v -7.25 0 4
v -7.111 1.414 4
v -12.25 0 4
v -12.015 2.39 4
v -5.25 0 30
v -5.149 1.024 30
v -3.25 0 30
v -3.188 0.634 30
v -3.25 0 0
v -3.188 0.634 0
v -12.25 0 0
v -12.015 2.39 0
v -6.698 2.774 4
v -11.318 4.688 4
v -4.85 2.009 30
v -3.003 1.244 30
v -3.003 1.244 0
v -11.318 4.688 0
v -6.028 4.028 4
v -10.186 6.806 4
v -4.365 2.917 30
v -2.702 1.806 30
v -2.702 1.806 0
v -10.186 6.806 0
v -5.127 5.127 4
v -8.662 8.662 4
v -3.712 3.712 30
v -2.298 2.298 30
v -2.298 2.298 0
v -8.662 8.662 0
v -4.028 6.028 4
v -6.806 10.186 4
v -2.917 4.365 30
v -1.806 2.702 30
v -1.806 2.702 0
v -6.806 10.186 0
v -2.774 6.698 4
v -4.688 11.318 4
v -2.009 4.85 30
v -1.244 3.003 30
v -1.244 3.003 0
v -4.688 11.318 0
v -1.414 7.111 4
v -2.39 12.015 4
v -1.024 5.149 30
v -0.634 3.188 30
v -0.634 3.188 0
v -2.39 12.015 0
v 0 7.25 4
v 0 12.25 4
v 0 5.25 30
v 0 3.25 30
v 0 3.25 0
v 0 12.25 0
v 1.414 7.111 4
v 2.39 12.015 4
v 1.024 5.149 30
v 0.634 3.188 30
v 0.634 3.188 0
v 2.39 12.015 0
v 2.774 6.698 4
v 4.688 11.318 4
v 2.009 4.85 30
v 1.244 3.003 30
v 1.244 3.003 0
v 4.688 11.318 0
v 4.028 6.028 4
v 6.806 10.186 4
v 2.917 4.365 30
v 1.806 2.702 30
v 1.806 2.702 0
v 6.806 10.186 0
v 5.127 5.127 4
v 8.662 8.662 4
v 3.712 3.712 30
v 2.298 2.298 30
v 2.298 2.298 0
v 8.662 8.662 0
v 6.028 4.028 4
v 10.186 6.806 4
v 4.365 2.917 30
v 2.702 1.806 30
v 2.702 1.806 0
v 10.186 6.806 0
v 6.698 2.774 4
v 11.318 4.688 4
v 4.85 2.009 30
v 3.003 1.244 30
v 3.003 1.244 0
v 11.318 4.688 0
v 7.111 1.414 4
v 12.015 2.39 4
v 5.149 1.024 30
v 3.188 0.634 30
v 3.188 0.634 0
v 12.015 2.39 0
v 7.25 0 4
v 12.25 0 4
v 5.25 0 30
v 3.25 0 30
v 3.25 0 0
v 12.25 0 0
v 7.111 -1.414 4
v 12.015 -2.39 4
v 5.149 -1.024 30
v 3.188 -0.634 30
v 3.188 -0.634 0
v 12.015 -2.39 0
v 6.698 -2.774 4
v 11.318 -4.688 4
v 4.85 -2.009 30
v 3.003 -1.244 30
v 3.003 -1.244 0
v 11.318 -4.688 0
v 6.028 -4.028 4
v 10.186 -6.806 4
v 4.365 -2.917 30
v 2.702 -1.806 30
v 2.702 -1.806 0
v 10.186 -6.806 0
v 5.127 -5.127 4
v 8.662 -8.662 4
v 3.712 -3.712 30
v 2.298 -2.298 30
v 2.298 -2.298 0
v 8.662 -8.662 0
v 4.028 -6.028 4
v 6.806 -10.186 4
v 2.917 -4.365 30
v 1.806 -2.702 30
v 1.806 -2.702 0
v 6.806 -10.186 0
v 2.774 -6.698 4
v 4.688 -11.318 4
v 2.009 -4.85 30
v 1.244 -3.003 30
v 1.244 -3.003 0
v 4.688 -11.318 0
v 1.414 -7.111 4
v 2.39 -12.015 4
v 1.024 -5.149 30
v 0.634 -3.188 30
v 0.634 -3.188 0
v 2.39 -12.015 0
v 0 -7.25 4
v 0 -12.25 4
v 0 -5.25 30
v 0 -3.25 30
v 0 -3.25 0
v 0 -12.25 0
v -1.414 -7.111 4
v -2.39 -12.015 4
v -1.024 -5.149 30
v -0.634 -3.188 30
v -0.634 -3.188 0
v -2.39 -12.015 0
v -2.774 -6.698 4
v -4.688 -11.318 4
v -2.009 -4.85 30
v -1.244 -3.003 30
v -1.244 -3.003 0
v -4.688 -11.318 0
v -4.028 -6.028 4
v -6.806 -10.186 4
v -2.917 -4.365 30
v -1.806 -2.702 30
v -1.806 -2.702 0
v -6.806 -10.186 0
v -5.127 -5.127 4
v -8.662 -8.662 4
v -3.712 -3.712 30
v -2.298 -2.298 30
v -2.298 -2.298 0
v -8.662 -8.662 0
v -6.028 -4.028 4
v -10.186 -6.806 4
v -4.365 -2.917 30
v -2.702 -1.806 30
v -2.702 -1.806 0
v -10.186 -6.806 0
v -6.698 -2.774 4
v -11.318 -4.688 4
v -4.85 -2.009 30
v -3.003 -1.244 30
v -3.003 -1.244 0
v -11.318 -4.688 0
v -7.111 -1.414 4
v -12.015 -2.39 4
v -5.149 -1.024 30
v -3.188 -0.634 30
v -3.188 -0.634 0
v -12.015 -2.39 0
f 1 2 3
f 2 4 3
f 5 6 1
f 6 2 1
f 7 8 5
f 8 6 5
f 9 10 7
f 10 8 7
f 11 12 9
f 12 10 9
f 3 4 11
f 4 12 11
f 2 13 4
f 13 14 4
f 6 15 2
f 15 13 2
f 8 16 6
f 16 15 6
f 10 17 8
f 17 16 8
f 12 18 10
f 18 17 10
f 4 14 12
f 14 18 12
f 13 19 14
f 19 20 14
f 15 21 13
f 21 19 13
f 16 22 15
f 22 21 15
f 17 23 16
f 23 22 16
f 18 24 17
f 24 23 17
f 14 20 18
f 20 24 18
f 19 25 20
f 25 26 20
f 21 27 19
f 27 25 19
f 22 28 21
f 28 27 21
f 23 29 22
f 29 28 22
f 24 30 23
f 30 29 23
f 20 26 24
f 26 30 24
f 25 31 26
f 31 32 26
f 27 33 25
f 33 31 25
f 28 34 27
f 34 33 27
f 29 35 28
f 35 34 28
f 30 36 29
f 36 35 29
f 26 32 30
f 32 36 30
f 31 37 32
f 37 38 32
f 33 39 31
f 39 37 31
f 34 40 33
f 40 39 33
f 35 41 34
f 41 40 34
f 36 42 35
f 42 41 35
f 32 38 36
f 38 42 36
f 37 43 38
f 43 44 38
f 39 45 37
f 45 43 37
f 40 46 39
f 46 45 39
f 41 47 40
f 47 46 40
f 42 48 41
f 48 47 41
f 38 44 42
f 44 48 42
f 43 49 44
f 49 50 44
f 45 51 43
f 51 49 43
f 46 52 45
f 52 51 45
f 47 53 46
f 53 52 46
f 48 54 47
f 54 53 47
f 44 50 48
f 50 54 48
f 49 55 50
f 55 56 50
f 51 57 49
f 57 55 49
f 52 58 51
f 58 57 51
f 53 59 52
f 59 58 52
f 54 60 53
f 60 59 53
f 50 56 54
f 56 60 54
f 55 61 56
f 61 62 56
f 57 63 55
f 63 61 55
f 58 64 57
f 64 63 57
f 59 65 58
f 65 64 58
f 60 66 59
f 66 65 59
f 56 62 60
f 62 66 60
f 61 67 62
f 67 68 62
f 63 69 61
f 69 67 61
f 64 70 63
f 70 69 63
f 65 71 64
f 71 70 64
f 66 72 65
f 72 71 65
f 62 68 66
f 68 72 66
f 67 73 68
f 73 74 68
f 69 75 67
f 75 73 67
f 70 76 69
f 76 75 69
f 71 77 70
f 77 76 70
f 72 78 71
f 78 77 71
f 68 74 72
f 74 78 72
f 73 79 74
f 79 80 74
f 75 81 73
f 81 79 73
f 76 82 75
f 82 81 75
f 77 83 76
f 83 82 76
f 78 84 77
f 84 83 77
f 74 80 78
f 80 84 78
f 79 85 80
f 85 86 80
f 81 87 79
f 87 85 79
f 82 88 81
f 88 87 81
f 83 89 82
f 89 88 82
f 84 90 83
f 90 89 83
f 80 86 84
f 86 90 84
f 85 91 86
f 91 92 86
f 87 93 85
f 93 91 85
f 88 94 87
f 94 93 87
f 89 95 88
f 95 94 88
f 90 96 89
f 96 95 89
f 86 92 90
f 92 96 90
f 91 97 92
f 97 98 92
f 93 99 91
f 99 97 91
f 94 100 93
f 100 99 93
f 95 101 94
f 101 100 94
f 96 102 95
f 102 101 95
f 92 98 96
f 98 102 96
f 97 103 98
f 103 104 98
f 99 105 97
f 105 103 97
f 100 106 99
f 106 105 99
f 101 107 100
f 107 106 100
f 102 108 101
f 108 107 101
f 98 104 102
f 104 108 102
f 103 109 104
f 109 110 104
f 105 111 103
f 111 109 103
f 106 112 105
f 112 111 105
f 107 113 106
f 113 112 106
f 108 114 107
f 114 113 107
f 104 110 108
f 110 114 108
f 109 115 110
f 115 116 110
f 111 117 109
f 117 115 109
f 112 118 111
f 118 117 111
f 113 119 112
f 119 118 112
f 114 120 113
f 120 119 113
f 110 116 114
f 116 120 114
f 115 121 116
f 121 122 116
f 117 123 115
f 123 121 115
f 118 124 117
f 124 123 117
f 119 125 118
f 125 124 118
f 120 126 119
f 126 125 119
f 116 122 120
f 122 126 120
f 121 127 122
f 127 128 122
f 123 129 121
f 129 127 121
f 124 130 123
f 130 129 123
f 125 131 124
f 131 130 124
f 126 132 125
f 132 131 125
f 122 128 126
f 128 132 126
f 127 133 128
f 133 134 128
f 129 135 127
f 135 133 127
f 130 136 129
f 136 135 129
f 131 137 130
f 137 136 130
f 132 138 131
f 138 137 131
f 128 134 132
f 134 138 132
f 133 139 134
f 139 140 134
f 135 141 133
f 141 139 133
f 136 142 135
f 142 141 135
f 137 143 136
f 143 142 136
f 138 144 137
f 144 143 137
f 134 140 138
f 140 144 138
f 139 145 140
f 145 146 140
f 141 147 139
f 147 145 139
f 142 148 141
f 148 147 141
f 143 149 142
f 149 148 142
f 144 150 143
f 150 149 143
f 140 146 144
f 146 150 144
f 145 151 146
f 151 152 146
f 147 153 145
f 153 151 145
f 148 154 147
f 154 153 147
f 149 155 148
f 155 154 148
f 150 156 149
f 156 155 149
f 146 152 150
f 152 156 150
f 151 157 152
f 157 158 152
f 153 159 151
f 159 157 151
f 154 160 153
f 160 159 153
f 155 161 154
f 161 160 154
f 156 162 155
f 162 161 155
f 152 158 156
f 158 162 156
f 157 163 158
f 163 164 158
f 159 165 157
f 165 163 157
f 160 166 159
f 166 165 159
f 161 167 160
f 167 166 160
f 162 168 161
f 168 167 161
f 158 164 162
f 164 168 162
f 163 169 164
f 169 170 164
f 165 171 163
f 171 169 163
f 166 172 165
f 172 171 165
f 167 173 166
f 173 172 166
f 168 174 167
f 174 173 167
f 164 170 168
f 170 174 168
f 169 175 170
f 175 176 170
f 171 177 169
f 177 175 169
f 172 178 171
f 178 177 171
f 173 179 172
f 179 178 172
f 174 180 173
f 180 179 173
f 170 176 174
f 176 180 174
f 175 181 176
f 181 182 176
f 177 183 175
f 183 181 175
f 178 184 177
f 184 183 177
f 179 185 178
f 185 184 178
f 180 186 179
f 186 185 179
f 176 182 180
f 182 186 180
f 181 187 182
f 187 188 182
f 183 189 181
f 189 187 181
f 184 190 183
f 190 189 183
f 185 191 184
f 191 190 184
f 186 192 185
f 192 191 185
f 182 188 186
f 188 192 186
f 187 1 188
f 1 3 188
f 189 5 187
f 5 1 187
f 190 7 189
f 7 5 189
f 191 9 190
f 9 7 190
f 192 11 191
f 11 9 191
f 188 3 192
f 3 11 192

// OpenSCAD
$fn = 32;

// ----------------------------------------------------------------------
// Profiled standoff: conical spacer, 30 mm long, bore 6.5 mm
// ----------------------------------------------------------------------

// --- parameters (mm) ---
revolve_angle = 360;      // full turn around the Z axis
profile_points = 6;       // points of the closed outline

profile = [[3.25, 0], [12.25, 0], [12.25, 4], [7.25, 4], [5.25, 30], [3.25, 30]];  // single closed polygon, 6 points, counter clockwise

// --- the one profile operation ---
rotate_extrude(angle = revolve_angle) polygon(points = profile);
